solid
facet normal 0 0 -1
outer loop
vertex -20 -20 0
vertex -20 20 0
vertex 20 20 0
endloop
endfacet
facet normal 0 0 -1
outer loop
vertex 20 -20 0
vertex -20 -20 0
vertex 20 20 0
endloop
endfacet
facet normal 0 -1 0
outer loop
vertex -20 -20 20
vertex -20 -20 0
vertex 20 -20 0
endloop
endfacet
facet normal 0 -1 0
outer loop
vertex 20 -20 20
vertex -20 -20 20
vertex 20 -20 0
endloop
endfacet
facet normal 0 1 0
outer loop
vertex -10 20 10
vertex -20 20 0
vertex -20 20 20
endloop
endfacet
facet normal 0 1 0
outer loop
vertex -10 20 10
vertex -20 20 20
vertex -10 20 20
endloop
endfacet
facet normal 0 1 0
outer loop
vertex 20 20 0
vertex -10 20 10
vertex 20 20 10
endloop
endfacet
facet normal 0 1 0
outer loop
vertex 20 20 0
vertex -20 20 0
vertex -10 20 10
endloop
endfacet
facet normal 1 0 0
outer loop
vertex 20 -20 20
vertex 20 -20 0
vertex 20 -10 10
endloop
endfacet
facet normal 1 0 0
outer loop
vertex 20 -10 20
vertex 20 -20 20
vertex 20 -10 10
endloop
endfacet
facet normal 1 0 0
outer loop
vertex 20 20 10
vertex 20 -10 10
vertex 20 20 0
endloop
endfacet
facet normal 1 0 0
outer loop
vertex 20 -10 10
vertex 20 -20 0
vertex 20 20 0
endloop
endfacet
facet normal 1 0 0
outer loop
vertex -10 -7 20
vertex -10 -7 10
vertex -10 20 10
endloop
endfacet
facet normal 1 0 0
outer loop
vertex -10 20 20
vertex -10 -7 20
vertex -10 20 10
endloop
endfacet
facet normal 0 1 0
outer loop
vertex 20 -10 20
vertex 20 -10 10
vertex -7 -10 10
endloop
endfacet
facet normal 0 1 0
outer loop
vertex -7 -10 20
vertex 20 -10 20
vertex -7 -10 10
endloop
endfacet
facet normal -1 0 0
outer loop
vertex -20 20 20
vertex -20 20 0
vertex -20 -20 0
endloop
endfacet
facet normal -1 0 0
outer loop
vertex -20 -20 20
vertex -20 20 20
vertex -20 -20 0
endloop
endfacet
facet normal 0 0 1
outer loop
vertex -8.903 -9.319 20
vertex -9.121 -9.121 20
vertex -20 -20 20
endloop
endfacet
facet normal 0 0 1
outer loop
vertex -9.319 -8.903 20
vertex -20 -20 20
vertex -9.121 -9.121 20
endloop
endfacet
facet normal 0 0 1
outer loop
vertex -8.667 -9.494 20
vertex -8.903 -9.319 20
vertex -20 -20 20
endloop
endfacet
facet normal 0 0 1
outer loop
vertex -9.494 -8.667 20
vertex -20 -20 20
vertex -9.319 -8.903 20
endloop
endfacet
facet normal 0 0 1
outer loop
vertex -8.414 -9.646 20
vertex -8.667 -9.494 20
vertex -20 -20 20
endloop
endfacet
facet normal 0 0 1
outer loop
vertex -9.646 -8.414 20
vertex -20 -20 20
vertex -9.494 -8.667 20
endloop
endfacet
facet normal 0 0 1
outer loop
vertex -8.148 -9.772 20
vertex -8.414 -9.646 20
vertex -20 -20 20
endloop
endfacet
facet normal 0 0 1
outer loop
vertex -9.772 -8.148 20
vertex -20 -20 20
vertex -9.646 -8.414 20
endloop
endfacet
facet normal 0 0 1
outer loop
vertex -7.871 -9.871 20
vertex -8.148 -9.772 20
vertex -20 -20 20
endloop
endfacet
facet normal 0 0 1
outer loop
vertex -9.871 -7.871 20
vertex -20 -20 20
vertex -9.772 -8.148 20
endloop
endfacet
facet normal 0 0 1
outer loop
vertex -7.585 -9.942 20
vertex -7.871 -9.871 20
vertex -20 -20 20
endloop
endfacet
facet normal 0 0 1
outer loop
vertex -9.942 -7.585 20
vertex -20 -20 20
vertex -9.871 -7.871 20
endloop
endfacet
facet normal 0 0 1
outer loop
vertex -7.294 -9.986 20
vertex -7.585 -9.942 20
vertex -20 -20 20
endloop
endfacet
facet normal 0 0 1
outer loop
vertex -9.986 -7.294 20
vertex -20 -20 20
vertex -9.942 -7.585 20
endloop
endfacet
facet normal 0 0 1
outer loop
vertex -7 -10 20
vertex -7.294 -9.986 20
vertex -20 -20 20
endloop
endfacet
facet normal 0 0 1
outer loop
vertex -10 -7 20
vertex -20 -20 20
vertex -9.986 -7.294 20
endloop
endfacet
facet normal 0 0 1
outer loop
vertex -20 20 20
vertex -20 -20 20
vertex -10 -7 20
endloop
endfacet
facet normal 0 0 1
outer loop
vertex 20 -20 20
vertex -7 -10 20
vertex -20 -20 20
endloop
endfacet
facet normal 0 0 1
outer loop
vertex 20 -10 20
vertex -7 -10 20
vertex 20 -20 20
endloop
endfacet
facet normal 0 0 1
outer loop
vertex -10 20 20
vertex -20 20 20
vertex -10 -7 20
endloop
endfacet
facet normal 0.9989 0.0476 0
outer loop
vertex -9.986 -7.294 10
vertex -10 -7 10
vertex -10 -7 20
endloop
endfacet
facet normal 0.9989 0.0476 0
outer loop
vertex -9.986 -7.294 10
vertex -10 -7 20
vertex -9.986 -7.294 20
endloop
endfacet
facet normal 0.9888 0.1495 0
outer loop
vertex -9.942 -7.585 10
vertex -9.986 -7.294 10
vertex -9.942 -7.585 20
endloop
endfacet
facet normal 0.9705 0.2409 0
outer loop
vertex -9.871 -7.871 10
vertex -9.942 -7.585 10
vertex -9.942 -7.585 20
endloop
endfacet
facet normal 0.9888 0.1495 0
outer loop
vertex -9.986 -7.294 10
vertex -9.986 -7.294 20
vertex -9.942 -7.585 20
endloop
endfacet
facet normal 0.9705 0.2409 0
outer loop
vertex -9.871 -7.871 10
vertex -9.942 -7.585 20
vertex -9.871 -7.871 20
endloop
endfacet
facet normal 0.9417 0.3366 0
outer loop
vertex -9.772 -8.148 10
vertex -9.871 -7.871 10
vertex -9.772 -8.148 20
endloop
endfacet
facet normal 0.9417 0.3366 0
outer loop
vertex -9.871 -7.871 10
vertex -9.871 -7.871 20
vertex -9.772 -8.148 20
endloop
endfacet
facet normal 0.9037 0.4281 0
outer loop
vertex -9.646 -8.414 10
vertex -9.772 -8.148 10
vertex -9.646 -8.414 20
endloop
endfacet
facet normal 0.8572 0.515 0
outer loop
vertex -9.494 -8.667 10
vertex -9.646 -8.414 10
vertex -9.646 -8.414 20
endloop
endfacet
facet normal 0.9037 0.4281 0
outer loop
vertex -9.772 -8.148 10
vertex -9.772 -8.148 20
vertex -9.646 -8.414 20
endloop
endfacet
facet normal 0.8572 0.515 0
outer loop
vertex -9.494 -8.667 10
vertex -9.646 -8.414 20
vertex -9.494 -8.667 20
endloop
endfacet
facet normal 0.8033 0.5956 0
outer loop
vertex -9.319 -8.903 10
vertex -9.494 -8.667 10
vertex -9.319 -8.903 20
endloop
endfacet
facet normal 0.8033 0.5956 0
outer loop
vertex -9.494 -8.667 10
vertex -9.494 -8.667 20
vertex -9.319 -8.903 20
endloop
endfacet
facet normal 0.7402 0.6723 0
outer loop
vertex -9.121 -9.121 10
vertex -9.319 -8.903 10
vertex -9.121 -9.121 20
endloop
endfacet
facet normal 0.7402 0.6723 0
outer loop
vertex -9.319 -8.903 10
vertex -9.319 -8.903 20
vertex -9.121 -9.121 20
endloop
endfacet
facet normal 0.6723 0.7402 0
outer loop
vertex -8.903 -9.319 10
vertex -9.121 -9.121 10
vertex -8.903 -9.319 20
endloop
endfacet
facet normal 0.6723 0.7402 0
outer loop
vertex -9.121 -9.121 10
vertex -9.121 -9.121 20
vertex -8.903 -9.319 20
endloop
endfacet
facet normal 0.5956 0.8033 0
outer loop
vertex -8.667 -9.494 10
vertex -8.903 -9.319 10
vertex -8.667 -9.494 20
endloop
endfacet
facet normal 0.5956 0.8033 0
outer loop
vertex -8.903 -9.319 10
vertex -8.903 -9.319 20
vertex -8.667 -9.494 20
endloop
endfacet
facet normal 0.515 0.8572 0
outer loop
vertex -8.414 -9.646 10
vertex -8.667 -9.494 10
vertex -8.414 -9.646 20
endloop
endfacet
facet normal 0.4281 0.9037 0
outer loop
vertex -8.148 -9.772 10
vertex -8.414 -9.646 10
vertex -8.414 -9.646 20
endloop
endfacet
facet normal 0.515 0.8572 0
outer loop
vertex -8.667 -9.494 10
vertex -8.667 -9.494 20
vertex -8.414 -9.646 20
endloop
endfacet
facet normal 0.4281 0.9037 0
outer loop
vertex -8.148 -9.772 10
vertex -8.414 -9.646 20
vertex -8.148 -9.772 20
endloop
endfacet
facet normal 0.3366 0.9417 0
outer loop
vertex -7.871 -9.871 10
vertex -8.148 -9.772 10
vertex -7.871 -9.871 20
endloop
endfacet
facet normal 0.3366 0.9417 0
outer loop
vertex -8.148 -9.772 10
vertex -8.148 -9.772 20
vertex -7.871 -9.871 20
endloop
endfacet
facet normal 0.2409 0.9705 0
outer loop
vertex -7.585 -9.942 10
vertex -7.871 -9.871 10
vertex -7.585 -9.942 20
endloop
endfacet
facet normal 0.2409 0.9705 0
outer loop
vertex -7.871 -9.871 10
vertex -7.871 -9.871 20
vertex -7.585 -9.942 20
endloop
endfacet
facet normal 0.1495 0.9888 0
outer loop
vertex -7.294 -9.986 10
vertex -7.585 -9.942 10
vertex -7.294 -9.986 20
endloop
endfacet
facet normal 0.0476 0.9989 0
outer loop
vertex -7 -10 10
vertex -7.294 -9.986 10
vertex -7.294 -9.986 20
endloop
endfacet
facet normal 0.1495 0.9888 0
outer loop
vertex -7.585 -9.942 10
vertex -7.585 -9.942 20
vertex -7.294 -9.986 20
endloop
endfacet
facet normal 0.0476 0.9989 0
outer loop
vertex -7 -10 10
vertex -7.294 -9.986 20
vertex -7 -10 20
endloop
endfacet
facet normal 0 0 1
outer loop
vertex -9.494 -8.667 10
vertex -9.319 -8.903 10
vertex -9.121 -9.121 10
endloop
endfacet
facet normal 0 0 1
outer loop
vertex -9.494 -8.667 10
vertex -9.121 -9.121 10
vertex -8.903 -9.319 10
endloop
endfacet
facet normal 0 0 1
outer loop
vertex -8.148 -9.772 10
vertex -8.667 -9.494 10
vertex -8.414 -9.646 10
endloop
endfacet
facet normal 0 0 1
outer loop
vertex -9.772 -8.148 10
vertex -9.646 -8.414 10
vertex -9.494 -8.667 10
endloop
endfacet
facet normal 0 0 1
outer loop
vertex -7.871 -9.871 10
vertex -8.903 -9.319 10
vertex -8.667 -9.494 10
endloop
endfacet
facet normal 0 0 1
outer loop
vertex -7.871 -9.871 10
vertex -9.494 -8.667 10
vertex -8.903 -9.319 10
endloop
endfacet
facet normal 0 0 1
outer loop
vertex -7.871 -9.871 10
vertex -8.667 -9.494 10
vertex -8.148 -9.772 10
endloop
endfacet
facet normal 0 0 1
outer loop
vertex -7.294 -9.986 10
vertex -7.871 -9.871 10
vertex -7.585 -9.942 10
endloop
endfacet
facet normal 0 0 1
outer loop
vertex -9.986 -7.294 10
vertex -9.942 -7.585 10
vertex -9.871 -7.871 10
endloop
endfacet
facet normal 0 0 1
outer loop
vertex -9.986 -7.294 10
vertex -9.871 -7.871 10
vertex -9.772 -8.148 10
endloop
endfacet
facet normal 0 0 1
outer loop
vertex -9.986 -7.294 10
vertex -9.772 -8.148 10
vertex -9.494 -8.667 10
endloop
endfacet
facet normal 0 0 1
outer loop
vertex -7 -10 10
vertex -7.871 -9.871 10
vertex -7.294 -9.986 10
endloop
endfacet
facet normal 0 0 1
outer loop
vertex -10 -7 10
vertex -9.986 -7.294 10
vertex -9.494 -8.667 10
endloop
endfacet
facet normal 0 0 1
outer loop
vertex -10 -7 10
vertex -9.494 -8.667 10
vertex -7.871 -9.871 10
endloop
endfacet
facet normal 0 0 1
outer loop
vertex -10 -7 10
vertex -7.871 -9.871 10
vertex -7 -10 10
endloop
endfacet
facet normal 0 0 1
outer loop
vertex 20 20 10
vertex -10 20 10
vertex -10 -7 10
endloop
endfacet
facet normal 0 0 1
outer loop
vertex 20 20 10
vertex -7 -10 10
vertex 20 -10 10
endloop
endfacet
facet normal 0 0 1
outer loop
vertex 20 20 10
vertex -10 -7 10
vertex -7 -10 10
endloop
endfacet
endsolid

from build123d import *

# Parameters (mm, degrees)
F1_DEPTH = 20
F0_W     = 30
F0_H     = 30
F2_DEPTH = 10
F3_R     = 3


with BuildPart() as f1:
    # F0 (on Top) → F1 (new body)
    with BuildSketch(Plane.XY):
        Polygon((-20, -20), (20, -20), (20, -10), (-10, -10), (-10, 20), (-20, 20), align=None)
    extrude(amount=F1_DEPTH)

    # F0 (on Top) → F2 (join)
    with BuildSketch(Plane.XY):
        with Locations((5, 5)):
            Rectangle(F0_W, F0_H)
    extrude(amount=F2_DEPTH)

    # F3
    f3_edges = [f1.edges().sort_by_distance(p)[0] for p in [
        (-10, -10, 15),
    ]]
    fillet(f3_edges, radius=F3_R)


solid = f1.part
